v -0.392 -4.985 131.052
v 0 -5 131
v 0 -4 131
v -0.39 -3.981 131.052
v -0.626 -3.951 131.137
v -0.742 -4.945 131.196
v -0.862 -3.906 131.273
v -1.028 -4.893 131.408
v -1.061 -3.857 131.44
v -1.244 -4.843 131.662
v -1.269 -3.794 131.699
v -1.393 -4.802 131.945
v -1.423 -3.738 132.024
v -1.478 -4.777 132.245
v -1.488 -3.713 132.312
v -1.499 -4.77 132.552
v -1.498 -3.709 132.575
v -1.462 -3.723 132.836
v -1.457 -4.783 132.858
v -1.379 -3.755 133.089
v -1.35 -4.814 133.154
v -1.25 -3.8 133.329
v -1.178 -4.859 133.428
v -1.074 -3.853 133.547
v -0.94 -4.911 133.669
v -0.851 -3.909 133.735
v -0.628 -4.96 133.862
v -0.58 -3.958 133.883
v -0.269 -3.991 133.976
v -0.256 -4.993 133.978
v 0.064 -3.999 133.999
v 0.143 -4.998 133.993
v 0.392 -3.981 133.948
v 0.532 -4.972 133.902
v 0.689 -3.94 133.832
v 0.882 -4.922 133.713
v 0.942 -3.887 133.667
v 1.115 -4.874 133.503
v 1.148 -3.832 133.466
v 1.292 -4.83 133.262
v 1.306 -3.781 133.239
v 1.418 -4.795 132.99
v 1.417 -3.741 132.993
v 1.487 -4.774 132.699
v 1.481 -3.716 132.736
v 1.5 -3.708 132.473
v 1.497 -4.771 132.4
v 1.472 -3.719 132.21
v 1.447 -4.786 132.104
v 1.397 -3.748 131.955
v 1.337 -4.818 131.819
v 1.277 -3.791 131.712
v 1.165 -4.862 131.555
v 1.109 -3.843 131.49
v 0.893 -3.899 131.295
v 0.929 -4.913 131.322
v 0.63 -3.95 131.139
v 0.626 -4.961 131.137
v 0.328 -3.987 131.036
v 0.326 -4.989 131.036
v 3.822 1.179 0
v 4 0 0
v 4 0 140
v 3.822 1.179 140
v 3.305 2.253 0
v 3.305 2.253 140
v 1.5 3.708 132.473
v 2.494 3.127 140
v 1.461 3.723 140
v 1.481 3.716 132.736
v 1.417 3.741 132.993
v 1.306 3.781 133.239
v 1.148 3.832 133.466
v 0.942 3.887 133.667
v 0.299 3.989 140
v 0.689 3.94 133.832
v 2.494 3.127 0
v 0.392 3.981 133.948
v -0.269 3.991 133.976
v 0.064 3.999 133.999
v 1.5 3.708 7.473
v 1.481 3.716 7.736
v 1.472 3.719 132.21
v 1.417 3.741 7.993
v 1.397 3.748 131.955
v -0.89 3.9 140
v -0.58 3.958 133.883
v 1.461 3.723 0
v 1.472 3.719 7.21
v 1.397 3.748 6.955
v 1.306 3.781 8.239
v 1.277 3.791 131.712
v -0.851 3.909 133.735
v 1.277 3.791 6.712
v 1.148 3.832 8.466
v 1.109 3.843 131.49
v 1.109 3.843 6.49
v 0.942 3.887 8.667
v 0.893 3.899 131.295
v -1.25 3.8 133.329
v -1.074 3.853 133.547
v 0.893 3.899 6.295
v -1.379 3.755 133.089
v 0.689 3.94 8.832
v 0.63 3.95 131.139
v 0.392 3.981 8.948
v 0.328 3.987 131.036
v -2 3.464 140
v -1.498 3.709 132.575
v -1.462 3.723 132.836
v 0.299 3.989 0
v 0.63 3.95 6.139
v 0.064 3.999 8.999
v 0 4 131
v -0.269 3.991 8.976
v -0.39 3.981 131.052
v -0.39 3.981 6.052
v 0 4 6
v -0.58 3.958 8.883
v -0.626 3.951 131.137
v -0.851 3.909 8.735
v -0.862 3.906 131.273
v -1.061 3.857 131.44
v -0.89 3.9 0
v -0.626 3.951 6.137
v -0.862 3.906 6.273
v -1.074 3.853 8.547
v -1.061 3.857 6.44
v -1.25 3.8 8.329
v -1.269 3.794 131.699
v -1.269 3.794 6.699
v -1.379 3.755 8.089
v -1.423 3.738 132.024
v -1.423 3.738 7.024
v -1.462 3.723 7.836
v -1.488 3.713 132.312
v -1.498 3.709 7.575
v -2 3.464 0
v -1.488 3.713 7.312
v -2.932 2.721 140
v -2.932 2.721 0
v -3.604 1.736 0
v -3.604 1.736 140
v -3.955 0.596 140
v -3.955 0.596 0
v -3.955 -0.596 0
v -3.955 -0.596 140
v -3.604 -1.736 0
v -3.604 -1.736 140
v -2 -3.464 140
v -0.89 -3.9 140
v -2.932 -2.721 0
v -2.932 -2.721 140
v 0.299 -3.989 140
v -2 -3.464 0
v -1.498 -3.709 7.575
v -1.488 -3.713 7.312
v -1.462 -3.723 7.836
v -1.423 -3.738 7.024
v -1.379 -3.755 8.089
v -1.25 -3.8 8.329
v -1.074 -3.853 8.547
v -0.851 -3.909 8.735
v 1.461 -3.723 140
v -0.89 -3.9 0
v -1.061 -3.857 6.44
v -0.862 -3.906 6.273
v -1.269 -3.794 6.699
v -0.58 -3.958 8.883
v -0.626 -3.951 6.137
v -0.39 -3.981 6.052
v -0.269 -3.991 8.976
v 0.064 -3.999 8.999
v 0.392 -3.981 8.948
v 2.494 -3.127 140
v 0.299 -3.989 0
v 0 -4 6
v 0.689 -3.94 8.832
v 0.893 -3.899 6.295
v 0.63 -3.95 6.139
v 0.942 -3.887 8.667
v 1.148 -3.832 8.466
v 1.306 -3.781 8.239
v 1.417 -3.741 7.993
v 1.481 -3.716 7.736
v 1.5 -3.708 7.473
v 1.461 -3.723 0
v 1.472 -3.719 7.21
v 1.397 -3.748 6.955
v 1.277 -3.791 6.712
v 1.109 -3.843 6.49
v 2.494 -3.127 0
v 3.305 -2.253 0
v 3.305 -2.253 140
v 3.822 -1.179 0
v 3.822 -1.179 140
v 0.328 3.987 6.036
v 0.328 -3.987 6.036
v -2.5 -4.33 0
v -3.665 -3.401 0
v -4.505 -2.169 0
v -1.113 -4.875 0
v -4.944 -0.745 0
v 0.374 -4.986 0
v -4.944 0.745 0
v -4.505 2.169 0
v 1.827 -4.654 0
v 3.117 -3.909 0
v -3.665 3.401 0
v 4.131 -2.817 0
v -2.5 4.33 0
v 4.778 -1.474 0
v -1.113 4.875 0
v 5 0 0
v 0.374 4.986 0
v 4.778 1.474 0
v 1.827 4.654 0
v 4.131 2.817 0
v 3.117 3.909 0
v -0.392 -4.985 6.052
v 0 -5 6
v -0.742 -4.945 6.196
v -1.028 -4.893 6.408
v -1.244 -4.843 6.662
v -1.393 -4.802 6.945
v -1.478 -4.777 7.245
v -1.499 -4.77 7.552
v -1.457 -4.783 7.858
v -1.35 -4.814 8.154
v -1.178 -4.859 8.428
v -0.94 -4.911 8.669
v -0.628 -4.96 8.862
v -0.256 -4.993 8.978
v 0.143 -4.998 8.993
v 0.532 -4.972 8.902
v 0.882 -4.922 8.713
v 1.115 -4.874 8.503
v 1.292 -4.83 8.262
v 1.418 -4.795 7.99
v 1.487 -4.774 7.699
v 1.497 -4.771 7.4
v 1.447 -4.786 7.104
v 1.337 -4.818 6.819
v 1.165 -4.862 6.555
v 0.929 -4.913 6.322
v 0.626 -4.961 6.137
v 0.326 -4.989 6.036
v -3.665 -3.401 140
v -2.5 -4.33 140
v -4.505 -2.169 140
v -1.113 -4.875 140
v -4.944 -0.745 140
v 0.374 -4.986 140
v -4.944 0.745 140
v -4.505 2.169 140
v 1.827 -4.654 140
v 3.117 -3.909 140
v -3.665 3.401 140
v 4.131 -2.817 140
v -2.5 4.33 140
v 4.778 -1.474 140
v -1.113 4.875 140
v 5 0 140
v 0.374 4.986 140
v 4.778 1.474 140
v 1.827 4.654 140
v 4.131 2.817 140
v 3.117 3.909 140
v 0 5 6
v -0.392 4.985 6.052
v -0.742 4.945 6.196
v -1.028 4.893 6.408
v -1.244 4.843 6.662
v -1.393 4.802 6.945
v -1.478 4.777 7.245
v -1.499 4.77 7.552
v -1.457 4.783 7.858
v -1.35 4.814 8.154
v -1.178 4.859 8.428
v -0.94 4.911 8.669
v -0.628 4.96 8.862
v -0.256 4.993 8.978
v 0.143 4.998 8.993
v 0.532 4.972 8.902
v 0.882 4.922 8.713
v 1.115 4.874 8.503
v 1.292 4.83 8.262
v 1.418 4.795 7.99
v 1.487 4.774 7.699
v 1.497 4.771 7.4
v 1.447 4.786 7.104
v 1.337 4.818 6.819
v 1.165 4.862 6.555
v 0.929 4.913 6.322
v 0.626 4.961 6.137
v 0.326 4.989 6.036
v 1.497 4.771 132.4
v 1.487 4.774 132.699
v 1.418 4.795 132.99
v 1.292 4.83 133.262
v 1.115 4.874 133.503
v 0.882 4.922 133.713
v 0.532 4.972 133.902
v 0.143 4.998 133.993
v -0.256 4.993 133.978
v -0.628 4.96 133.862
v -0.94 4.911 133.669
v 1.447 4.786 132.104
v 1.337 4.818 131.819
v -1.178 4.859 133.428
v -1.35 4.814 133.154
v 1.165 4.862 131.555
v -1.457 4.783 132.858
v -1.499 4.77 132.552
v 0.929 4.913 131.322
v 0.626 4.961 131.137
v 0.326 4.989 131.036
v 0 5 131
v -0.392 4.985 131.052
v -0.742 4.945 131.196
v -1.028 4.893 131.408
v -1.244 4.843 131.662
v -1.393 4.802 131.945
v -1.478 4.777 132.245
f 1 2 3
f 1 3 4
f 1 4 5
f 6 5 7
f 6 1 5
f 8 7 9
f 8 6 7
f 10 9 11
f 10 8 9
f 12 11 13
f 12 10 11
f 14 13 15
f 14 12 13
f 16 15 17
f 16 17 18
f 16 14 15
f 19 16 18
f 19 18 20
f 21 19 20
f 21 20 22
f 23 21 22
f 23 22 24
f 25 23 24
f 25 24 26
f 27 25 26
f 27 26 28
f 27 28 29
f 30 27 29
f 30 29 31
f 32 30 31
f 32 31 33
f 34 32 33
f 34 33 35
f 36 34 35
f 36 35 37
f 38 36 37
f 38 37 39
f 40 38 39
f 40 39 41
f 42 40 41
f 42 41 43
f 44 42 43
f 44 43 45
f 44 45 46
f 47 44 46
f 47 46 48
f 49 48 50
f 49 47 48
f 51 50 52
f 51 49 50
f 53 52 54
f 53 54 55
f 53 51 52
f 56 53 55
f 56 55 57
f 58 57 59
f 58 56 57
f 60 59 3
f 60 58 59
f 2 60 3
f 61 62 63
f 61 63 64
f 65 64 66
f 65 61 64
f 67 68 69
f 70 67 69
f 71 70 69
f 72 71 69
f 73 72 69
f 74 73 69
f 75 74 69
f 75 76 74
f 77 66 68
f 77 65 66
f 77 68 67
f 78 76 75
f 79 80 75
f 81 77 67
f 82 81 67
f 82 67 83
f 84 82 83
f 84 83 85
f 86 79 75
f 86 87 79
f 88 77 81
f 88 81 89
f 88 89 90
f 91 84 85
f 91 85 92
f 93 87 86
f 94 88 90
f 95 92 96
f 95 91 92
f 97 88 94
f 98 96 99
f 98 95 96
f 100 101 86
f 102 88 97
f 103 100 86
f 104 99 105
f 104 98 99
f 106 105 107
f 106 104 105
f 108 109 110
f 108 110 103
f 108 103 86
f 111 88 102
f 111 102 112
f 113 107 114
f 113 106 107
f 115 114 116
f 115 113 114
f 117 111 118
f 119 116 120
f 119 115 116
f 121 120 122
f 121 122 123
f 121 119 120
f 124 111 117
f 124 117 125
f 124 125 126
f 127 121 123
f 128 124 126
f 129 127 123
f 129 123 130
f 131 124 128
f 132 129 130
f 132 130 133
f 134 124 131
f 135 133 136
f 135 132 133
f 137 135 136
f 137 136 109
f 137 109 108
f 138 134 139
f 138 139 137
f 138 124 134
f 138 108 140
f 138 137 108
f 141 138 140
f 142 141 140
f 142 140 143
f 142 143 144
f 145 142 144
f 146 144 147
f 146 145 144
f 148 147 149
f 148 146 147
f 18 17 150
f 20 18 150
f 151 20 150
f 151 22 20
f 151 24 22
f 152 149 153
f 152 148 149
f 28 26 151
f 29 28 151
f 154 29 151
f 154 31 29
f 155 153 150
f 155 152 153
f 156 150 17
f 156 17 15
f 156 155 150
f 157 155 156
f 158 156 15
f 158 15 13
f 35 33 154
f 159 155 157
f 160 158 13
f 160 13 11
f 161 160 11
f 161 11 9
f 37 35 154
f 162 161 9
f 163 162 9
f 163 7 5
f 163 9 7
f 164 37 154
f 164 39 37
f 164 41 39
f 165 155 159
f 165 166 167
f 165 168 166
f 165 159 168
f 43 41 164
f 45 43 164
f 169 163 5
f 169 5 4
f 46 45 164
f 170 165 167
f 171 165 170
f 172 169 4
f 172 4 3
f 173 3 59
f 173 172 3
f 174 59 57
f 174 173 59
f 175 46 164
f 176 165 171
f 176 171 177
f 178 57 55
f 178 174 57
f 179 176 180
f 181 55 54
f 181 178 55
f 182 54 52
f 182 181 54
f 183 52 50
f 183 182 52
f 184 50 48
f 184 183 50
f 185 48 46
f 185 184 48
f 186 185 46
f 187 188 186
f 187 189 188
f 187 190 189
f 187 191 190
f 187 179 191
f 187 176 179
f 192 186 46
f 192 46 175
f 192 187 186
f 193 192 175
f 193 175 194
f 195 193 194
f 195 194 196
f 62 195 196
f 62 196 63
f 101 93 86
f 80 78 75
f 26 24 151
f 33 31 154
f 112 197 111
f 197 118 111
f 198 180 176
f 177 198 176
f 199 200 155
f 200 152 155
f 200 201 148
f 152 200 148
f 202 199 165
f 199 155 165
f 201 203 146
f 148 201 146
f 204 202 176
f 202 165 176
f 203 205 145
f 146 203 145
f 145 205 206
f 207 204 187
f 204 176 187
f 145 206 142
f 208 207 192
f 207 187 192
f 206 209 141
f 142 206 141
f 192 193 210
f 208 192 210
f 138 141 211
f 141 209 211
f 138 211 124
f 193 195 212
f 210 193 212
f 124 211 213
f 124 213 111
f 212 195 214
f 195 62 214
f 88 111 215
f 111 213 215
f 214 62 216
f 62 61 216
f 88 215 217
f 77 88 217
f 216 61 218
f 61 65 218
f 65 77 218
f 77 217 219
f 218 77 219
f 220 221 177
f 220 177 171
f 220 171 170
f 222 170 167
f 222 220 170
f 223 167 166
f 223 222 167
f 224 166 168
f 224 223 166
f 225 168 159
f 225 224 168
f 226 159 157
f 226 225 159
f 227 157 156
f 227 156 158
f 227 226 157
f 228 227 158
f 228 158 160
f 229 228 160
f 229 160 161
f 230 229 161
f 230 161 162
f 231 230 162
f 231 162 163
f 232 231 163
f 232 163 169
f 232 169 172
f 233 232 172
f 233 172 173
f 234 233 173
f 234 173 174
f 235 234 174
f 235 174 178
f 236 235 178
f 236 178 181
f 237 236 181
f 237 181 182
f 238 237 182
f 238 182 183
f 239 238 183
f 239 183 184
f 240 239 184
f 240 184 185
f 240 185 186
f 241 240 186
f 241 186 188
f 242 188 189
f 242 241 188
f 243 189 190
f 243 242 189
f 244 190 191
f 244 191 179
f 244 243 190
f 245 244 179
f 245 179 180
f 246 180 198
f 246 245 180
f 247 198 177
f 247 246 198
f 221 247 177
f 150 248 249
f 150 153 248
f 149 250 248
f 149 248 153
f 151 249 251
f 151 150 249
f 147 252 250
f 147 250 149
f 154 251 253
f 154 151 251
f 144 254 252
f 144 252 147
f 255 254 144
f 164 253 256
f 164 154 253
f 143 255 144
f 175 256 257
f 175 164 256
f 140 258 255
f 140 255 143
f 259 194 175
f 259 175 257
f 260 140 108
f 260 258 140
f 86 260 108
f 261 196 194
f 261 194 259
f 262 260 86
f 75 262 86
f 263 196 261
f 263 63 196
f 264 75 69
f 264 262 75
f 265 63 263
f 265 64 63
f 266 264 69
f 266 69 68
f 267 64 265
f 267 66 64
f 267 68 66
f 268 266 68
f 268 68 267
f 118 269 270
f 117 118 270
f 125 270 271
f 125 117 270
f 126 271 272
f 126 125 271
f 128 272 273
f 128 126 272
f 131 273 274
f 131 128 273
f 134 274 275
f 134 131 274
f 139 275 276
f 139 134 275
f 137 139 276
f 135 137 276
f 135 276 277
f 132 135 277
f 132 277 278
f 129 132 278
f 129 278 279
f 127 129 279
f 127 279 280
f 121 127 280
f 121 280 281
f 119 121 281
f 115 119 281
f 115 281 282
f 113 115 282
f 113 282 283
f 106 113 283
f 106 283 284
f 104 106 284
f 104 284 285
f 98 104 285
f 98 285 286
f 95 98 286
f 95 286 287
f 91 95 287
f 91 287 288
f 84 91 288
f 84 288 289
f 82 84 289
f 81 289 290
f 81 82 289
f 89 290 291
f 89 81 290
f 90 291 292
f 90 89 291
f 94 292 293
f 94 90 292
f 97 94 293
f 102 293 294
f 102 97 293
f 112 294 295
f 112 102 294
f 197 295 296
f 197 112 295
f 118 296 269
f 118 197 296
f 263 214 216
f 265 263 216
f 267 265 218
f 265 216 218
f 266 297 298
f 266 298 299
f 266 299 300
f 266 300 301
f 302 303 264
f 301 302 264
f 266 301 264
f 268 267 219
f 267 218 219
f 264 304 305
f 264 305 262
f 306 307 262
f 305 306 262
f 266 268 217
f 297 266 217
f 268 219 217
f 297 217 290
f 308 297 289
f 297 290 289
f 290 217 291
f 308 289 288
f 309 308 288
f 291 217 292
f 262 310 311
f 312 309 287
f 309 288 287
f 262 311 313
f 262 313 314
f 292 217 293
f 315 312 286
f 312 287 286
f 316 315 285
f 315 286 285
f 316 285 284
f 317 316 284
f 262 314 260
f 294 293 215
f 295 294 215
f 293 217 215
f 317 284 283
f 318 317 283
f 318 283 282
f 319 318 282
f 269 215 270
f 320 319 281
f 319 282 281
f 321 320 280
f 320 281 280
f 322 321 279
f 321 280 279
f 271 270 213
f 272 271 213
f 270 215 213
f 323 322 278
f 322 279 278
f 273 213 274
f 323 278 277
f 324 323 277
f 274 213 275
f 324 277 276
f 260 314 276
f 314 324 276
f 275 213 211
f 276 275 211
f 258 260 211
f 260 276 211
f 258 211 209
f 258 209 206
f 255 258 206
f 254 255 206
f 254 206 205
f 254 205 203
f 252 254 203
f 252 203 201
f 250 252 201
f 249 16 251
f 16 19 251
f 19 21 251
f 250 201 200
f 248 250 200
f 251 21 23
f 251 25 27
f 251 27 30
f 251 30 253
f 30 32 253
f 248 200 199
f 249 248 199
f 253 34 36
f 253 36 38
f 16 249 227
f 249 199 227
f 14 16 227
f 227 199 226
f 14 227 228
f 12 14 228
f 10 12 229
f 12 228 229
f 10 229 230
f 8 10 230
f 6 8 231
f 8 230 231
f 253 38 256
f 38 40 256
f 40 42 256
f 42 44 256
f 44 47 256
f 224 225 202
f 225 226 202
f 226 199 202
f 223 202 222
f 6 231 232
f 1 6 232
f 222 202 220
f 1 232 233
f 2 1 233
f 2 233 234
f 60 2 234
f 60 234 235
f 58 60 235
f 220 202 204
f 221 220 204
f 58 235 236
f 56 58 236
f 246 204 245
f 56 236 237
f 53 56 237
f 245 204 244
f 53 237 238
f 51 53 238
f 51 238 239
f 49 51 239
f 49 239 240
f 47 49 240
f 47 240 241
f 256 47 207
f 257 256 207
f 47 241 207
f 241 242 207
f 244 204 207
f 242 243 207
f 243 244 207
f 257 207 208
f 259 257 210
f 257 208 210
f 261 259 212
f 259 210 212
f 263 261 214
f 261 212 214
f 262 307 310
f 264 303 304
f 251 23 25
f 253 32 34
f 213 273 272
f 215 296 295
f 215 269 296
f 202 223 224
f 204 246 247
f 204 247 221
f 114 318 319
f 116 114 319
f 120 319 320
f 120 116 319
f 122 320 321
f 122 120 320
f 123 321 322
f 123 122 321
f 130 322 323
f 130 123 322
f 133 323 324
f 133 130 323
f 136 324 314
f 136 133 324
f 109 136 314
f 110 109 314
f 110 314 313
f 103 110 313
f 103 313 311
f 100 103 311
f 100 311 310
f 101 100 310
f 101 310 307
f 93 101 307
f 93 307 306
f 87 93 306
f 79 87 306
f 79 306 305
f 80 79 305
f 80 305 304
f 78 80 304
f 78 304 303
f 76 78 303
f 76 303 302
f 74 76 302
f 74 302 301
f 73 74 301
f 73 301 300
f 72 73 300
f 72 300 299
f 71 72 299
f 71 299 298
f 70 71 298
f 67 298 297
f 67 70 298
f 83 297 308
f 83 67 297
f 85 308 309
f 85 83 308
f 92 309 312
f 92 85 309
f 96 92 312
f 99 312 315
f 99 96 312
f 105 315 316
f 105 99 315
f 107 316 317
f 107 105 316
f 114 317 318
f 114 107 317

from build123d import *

# Parameters (mm, degrees)
SKETCH1_R               = 5
SKETCH1_R_2             = 4
BOSS_EXTRUDE1_DEPTH     = 140
CUT_EXTRUDE1_DEPTH      = 175
CUT_EXTRUDE1_DEPTH_BACK = 175
SKETCH3_R               = 1.5
CUT_EXTRUDE2_DEPTH      = 10
CUT_EXTRUDE2_DEPTH_BACK = 10
SKETCH4_R               = 1.5


with BuildPart() as part:
    # Sketch1 → Boss-Extrude1 (new body)
    with BuildSketch(Plane.XY):
        Circle(SKETCH1_R)
        Circle(SKETCH1_R_2, mode=Mode.SUBTRACT)
    extrude(amount=BOSS_EXTRUDE1_DEPTH)

    # Sketch3 → Cut-Extrude1 (cut, two sides: drawn at the far end of the back side and taken through both)
    with BuildSketch(Plane(origin=(0, 0, 0), x_dir=(1, 0, 0), z_dir=(0, 1, 0)).offset(-CUT_EXTRUDE1_DEPTH_BACK)):
        with Locations((0, -7.5)):
            Circle(SKETCH3_R)
    extrude(amount=CUT_EXTRUDE1_DEPTH + CUT_EXTRUDE1_DEPTH_BACK, mode=Mode.SUBTRACT)

    # Sketch4 → Cut-Extrude2 (cut, two sides: drawn at the far end of the back side and taken through both)
    with BuildSketch(Plane(origin=(0, 0, 0), x_dir=(1, 0, 0), z_dir=(0, 1, 0)).offset(-CUT_EXTRUDE2_DEPTH_BACK)):
        with Locations((0, -132.5)):
            Circle(SKETCH4_R)
    extrude(amount=CUT_EXTRUDE2_DEPTH + CUT_EXTRUDE2_DEPTH_BACK, mode=Mode.SUBTRACT)


solid = part.part
